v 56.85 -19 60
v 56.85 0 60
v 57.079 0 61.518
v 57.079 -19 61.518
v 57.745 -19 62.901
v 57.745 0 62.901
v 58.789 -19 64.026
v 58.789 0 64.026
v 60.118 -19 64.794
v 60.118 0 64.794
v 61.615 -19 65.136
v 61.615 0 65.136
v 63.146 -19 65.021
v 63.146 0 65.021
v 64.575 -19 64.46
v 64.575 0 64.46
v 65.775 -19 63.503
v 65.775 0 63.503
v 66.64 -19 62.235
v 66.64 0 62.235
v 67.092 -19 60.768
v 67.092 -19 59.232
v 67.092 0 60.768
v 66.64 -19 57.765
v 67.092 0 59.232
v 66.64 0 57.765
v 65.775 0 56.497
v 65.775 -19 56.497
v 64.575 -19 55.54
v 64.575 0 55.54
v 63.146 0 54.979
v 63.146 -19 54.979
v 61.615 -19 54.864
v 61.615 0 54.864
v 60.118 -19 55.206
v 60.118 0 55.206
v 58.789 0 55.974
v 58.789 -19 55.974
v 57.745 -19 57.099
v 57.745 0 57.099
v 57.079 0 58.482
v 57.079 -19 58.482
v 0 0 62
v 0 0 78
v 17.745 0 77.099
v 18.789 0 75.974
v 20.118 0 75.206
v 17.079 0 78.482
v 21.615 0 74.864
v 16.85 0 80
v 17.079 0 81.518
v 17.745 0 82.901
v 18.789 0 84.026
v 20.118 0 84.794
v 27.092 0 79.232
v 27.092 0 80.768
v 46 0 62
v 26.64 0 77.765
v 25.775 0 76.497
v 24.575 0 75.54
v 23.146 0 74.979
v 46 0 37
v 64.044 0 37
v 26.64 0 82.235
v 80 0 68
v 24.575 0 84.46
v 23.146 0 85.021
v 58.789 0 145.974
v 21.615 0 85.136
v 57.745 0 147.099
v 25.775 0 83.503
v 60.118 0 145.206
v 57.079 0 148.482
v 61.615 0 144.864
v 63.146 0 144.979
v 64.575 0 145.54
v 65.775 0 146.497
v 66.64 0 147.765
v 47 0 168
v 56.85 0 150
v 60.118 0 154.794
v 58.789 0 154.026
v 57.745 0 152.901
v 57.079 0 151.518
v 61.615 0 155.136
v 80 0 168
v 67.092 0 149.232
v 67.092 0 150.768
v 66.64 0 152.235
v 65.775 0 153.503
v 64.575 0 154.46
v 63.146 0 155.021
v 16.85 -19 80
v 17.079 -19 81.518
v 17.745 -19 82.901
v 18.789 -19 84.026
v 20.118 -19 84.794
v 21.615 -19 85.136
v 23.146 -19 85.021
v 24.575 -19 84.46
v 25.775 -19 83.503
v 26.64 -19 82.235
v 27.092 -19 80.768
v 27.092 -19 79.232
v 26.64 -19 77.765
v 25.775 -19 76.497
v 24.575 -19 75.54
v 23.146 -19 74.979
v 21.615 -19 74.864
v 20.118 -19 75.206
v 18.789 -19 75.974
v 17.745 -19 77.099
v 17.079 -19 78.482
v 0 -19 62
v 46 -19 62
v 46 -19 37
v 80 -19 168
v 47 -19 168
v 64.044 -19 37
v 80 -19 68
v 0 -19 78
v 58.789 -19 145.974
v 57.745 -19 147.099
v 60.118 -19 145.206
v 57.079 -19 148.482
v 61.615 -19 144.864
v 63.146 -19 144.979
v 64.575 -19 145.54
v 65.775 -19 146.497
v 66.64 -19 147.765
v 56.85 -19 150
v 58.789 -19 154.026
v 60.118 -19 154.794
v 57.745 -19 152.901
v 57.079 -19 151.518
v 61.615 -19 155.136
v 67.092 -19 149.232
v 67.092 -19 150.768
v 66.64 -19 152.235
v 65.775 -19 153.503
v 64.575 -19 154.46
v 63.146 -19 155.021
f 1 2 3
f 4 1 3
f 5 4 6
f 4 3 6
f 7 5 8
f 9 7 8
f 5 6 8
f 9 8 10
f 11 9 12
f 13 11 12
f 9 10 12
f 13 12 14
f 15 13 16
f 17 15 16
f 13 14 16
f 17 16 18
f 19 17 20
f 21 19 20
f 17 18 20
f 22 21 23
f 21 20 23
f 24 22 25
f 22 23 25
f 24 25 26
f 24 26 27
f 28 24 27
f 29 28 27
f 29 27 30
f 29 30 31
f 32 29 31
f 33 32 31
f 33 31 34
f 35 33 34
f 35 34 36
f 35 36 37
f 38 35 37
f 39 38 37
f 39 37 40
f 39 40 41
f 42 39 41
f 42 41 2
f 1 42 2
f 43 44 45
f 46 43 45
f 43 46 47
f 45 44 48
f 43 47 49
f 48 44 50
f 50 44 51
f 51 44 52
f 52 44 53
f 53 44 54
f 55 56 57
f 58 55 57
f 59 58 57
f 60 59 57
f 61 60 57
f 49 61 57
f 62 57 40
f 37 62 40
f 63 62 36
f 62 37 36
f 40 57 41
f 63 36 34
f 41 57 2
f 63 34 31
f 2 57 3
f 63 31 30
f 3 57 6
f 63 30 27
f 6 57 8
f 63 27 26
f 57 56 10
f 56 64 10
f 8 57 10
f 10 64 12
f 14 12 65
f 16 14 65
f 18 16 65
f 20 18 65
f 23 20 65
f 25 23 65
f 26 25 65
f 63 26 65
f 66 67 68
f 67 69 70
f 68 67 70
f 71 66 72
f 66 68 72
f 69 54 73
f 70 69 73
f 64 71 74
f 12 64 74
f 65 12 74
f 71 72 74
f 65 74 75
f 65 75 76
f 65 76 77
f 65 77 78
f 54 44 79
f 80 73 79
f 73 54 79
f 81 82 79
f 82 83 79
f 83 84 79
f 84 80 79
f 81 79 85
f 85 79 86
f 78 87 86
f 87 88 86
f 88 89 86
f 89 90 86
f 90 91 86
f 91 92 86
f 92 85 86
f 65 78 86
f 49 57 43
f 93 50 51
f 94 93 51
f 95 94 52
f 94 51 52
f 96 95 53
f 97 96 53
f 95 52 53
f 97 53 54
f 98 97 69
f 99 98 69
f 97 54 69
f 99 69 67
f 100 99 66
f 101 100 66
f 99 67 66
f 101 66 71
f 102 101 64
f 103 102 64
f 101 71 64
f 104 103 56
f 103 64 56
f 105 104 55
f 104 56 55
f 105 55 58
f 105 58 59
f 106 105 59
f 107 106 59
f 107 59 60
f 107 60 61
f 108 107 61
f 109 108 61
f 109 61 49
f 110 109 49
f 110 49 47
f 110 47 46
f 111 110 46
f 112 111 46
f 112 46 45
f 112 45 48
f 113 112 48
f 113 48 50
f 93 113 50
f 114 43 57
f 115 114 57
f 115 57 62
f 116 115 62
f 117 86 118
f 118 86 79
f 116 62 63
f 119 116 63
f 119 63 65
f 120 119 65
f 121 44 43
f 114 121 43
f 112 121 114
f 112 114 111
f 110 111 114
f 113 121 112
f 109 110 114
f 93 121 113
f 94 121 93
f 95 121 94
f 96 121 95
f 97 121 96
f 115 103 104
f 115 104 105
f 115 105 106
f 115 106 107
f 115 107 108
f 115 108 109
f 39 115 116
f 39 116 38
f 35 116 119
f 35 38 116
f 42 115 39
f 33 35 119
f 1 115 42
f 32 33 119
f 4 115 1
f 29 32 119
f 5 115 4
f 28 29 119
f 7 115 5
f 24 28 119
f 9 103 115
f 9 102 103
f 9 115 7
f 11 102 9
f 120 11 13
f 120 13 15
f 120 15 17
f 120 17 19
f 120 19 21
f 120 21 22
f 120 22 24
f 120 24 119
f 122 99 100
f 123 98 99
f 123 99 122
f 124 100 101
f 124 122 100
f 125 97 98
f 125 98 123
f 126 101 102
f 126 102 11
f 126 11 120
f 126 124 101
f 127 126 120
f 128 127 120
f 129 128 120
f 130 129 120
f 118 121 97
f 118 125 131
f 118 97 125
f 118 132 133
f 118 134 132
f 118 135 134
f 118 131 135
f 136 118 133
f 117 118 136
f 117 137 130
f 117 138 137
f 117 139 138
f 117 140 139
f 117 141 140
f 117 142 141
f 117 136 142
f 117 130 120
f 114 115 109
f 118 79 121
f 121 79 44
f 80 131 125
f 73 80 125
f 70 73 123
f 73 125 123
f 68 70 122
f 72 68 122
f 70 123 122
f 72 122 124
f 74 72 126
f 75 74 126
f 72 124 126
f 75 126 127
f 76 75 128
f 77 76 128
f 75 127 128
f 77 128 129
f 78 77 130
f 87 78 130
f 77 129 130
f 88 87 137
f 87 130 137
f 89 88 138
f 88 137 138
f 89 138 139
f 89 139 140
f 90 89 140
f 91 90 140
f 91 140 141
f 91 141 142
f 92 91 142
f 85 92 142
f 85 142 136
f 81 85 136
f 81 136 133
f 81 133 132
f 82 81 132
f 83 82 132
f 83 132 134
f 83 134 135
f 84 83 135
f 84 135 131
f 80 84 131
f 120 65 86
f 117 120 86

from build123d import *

# Parameters (mm, degrees)
F1_DEPTH = 19
F2_D     = 10.3
F4_D     = 10.3


with BuildPart() as f1:
    # F0 (on Front) → F1 (new body)
    with BuildSketch(Plane.XZ):
        Polygon((80, 168), (47, 168), (0, 78), (0, 62), (46, 62), (46, 37), (64.0441176471, 37), (80, 68), align=None)
    extrude(amount=F1_DEPTH)

    # F2 (through all)
    with Locations(Plane(origin=(0, 0, 0), x_dir=(1, 0, 0), z_dir=(0, 1, 0))):
        with Locations((62, -150)):
            Hole(F2_D / 2)

    # F4 (through all)
    with Locations(Plane.XZ.offset(19)):
        with Locations((22, 80), (62, 60)):
            Hole(F4_D / 2)


solid = f1.part
